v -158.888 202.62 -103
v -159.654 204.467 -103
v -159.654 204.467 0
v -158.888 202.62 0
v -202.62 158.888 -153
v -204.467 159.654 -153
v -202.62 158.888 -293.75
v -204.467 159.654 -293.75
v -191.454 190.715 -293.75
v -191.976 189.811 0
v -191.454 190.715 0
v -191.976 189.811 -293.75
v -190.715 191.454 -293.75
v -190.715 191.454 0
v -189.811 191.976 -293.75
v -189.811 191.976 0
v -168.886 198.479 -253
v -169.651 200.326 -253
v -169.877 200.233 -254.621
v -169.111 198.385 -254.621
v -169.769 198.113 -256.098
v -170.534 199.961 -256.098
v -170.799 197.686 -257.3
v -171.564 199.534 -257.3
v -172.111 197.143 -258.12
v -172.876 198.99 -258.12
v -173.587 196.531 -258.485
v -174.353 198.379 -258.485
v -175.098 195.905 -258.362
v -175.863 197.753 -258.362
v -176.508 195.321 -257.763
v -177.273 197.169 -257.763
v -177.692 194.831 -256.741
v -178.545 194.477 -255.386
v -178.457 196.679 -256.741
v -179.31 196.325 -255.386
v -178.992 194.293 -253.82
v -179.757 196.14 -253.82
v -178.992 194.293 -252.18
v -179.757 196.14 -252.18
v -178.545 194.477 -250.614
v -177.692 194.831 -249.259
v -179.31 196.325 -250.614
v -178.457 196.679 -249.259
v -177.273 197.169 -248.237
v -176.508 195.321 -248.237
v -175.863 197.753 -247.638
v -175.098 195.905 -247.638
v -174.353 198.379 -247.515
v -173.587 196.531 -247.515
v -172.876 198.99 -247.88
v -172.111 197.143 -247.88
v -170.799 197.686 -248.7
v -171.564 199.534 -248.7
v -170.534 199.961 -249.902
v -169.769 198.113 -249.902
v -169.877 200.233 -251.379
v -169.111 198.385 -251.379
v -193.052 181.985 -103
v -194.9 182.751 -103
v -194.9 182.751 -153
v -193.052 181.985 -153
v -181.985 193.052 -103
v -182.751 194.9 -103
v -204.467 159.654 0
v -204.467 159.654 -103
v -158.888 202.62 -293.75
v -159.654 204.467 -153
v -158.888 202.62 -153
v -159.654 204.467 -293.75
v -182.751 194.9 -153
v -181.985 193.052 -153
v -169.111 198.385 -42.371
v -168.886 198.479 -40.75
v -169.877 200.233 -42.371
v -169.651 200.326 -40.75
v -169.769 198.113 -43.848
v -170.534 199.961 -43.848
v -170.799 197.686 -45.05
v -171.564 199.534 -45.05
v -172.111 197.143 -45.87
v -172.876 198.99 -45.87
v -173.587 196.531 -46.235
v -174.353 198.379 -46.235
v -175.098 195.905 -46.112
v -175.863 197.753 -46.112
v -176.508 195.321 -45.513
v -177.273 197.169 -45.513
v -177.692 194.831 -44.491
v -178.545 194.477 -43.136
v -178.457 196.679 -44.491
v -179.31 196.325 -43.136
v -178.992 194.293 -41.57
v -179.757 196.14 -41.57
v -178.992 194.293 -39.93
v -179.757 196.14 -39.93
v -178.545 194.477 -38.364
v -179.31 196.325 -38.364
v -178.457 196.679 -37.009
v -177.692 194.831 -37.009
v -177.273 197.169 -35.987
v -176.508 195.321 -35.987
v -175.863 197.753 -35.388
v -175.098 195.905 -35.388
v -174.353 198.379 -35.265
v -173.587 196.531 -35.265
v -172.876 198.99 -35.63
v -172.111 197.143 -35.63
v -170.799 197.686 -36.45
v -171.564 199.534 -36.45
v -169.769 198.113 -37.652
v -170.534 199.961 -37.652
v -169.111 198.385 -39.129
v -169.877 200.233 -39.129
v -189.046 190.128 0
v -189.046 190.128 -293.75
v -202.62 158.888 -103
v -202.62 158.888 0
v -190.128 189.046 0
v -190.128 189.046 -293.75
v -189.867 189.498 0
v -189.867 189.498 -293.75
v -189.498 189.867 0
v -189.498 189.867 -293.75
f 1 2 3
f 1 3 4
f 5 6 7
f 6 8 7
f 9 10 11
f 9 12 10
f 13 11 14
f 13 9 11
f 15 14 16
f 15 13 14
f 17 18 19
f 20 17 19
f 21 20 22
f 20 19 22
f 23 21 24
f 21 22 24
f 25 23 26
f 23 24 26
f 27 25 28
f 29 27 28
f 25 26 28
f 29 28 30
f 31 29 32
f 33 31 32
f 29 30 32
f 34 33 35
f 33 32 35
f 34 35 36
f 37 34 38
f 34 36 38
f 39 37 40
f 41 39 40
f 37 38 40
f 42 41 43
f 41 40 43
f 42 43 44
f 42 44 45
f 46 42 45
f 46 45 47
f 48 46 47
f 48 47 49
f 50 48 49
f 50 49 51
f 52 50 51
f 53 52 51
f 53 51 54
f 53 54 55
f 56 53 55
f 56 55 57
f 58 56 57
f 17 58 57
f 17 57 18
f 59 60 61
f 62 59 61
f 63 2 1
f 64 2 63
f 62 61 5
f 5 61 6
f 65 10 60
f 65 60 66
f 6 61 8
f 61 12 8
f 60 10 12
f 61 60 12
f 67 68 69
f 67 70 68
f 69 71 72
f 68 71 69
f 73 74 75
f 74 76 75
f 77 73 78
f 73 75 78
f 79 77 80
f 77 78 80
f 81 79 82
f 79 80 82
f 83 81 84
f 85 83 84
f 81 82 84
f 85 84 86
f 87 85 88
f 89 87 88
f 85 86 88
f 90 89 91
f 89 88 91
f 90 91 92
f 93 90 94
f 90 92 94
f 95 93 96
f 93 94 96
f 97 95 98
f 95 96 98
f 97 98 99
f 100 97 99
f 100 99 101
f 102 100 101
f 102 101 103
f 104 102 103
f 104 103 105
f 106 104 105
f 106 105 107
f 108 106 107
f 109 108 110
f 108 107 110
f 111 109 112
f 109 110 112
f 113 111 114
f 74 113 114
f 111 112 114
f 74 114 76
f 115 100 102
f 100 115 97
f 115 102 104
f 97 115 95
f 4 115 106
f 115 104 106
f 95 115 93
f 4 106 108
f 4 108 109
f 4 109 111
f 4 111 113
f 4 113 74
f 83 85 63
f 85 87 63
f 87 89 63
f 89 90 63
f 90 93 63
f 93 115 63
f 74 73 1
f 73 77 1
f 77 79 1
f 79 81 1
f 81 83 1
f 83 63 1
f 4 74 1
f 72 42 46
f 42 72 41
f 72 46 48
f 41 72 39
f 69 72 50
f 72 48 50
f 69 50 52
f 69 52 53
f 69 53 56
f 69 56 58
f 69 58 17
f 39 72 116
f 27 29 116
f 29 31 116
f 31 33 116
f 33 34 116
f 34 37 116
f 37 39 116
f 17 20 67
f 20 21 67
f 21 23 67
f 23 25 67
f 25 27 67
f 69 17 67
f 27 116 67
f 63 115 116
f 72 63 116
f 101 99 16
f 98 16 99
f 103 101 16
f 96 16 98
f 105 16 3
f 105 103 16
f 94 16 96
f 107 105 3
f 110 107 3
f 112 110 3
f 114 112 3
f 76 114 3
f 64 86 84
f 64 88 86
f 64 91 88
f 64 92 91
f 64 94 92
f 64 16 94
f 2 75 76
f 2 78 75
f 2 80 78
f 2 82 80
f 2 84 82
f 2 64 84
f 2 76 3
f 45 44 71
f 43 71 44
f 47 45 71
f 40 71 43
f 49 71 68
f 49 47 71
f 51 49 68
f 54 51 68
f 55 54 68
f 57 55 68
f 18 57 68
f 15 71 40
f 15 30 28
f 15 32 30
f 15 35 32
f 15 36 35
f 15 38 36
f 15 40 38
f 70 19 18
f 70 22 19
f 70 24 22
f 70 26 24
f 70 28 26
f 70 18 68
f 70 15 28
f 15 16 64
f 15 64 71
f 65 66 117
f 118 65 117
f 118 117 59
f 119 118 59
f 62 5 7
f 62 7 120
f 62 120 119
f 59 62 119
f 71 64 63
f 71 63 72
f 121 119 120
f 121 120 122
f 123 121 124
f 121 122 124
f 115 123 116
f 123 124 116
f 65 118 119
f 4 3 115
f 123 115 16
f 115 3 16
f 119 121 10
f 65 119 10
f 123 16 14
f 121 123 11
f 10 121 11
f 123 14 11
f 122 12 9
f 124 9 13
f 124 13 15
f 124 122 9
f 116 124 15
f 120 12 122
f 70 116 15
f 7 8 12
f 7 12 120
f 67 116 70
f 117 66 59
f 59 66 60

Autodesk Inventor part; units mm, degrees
ref_plane "YZ Plane" through (0, 0, 0) normal (1, 0, 0) x (0, 1, 0)
ref_plane "XZ Plane" through (0, 0, 0) normal (0, 1, 0) x (-1, 0, 0)
ref_plane "XY Plane" through (0, 0, 0) normal (0, 0, 1) x (1, 0, 0)
sketch "Sketch4" plane through (0, 0, 0) normal (0, 0, 1) x (1, 0, 0)
  line L0 (-193.637817, 193.637817) -> (0, 273.845227) construction
  line L1 (0, 273.845227) -> (193.637817, 193.637817) construction
  line L2 (193.637817, 193.637817) -> (273.845227, 0) construction
  line L3 (273.845227, 0) -> (193.637817, -193.637817) construction
  line L4 (193.637817, -193.637817) -> (0, -273.845227) construction
  line L5 (0, -273.845227) -> (-193.637817, -193.637817) construction
  line L6 (-193.637817, -193.637817) -> (-273.845227, 0) construction
  line L7 (-273.845227, 0) -> (-193.637817, 193.637817) construction
  line L8 (-191.341716, 191.341716) -> (0, 270.59805) construction
  line L9 (0, 270.59805) -> (191.341716, 191.341716) construction
  line L10 (191.341716, 191.341716) -> (270.59805, 0) construction
  line L11 (270.59805, 0) -> (191.341716, -191.341716) construction
  line L12 (191.341716, -191.341716) -> (0, -270.59805) construction
  line L13 (0, -270.59805) -> (-191.341716, -191.341716) construction
  line L14 (-191.341716, -191.341716) -> (-270.59805, 0) construction
  line L15 (-270.59805, 0) -> (-191.341716, 191.341716) construction
  line L16 (-189.810982, 191.975767) -> (-159.653707, 204.467319)
  line L17 (-191.975767, 189.810982) -> (-204.467319, 159.653707)
  arc A0 (-189.810982, 191.975767) -> (-191.975767, 189.810982) centre (-188.280249, 188.280249) ccw
  point P0 (0, 0)
  point P1 (0, 0)
  point P2 (0, 0)
  dimension "d16" = 506
  dimension "d22" = 3
  dimension "d23" = 32.642
  dimension "d24" = 4
contour flange "Contour Flange1" sketch "Sketch4" thickness 2 bend radius 2 width 2006 along (0, 0, -1) mid plane no both sides no wall seen from (-174.732345, 198.221543, 0) lies toward (0.3826834, -0.9238795, 0) curves L16 A0 L17
bend "Bend2"
corner "Corner2"
sketch "Sketch6" plane through (-189.810982, 191.975767, 0) normal (-0.3826834, 0.9238795, 0) x (0.9238795, 0.3826834, 0)
  circle A0 centre (16.321, 40.75) radius 5.5
  line L0 (32.642, 0) -> (0, 0) projected
  circle A1 centre (16.321, 1965.25) radius 5.5
  line L1 (32.642, 2006) -> (0, 2006) projected
  point P0 (101.896536, 0)
  point P1 (16.321, 0)
  point P2 (16.321, 0)
  point P3 (16.321, 0)
  point P4 (16.321, 0)
  point P5 (16.321, 2006)
  point P6 (16.321, 2006)
  dimension "d36" = 11
  dimension "d37" = 40.75
  dimension "d40" = 40.75
  dimension "d41" = 11
extrude "Extrusion1" cut sketch "Sketch6" against normal up to surface (2 mm away)
sketch "Sketch10" plane through (-189.810982, 191.975767, 0) normal (-0.3826834, 0.9238795, 0) x (0.9238795, 0.3826834, 0)
  line L0 (7.642, 1153) -> (32.642, 1153)
  line L1 (32.642, 1153) -> (32.642, 1103)
  line L2 (32.642, 1103) -> (7.642, 1103)
  line L3 (7.642, 1103) -> (7.642, 1153)
  line L4 (32.642, 2006) -> (0, 2006) projected
  line L5 (0, 0) -> (0, 2006) projected
  point P0 (0, 1003)
  point P1 (7.642, 1128)
  dimension "d70" = 50
  dimension "d71" = 25
  dimension "d72" = 125
extrude "Extrusion5" cut sketch "Sketch10" against normal through all
sketch "Sketch12" plane through (-191.975767, 189.810982, -2006) normal (-0.9238795, 0.3826834, 0) x (0, 0, 1)
  line L0 (853, -32.642) -> (903, -32.642)
  line L1 (903, -32.642) -> (903, -7.642)
  line L2 (903, -7.642) -> (853, -7.642)
  line L3 (853, -7.642) -> (853, -32.642)
  line L4 (2006, 0) -> (0, 0) projected
  point P0 (2006, -101.896536)
  point P1 (0, -32.642)
  point P2 (1003, 0)
  point P3 (878, -7.642)
  dimension "d75" = 50
  dimension "d76" = 25
  dimension "d77" = 125
extrude "Extrusion6" cut sketch "Sketch12" against normal through all
pattern_linear "Rectangular Pattern4" count 8 spacing 250 along (0, 0, 1) of "Extrusion6", "Extrusion5" first direction both ways yes
sketch "Sketch13" plane through (-189.810982, 191.975767, 0) normal (-0.3826834, 0.9238795, 0) x (0.9238795, 0.3826834, 0)
  circle A0 centre (16.321, 1003) radius 5.5
  line L0 (32.642, 903) -> (32.642, 1103) projected
  line L1 (32.642, 0) -> (0, 0) projected
  point P0 (101.896536, 0)
  point P1 (32.642, 1003)
  point P2 (16.321, 0)
  dimension "d83" = 11
extrude "Extrusion7" cut sketch "Sketch13" against normal through all
pattern_linear "Rectangular Pattern5" count 7 spacing 250 along (0, 0, 1) of "Extrusion7" first direction both ways yes
sketch "Sketch14" plane through (0, 0, 0) normal (0, 1, 0) x (-1, 0, 0)
  line L0 (-300, 0) -> (300, 0) construction
  line L1 (300, 0) -> (300, -1712.25)
  line L2 (300, -1712.25) -> (-300, -1712.25)
  line L3 (-300, -1712.25) -> (-300, 0)
  line L4 (159.653707, -2006) -> (189.810982, -2006)
  line L5 (300, -293.75) -> (-300, -293.75)
  line L6 (300, -2006) -> (-300, -2006)
  line L7 (-300, -2006) -> (-300, -1712.25)
  line L8 (300, -2006) -> (300, -1712.25)
  point P0 (0, 0)
  point P1 (0, 0)
  dimension "d89" = 600
  dimension "d90" = 1712.25
  dimension "d94" = 293.75
  dimension "d95" = 293.75
extrude "Extrusion8" cut sketch "Sketch14" along normal blind 600
equation "\"d40\" = d37"
equation "\"d72\" = Отступ_окна_от_середины"
equation "\"d77\" = Отступ_окна_от_середины"
equation "\"d16\" = Барабан_габарит_по_кассетам"
equation "\"d24\" = BendRadius + Thickness"
equation "\"d41\" = d36"
equation "\"d70\" = Ширина_окна_барабан"
equation "\"d75\" = Ширина_окна_барабан"
equation "\"d25\" = Thickness"
equation "\"d26\" = BendReliefWidth"
equation "\"d27\" = BendReliefDepth"
equation "\"d28\" = MinimumRemnant"
equation "\"d29\" = TransitionRadius"
equation "\"d30\" = Барабан_длина_листа"
equation "\"d31\" = BendRadius"
equation "\"d33\" = CornerReliefSize"
equation "\"d34\" = GapSize"
equation "\"d35\" = JacobiRadiusSize"
equation "\"BendRadius\" = Thickness"
equation "\"BendReliefWidth\" = Thickness"
equation "\"BendReliefDepth\" = 0.5 * Thickness"
equation "\"CornerReliefSize\" = 4 * Thickness"
equation "\"MinimumRemnant\" = 2 * Thickness"
equation "\"TransitionRadius\" = BendRadius"
equation "\"JacobiRadiusSize\" = BendRadius"
equation "\"GapSize\" = Thickness"
equation "\"Барабан_габарит_по_кассетам\" = 506"
equation "\"Thickness\" = 2"
equation "\"Ширина_окна_барабан\" = 50"
equation "\"Барабан_длина_листа\" = 2006"
equation "\"Отступ_окна_от_середины\" = 125"
properties part number "ДМС 103 Полка для крышки ПВГ"
